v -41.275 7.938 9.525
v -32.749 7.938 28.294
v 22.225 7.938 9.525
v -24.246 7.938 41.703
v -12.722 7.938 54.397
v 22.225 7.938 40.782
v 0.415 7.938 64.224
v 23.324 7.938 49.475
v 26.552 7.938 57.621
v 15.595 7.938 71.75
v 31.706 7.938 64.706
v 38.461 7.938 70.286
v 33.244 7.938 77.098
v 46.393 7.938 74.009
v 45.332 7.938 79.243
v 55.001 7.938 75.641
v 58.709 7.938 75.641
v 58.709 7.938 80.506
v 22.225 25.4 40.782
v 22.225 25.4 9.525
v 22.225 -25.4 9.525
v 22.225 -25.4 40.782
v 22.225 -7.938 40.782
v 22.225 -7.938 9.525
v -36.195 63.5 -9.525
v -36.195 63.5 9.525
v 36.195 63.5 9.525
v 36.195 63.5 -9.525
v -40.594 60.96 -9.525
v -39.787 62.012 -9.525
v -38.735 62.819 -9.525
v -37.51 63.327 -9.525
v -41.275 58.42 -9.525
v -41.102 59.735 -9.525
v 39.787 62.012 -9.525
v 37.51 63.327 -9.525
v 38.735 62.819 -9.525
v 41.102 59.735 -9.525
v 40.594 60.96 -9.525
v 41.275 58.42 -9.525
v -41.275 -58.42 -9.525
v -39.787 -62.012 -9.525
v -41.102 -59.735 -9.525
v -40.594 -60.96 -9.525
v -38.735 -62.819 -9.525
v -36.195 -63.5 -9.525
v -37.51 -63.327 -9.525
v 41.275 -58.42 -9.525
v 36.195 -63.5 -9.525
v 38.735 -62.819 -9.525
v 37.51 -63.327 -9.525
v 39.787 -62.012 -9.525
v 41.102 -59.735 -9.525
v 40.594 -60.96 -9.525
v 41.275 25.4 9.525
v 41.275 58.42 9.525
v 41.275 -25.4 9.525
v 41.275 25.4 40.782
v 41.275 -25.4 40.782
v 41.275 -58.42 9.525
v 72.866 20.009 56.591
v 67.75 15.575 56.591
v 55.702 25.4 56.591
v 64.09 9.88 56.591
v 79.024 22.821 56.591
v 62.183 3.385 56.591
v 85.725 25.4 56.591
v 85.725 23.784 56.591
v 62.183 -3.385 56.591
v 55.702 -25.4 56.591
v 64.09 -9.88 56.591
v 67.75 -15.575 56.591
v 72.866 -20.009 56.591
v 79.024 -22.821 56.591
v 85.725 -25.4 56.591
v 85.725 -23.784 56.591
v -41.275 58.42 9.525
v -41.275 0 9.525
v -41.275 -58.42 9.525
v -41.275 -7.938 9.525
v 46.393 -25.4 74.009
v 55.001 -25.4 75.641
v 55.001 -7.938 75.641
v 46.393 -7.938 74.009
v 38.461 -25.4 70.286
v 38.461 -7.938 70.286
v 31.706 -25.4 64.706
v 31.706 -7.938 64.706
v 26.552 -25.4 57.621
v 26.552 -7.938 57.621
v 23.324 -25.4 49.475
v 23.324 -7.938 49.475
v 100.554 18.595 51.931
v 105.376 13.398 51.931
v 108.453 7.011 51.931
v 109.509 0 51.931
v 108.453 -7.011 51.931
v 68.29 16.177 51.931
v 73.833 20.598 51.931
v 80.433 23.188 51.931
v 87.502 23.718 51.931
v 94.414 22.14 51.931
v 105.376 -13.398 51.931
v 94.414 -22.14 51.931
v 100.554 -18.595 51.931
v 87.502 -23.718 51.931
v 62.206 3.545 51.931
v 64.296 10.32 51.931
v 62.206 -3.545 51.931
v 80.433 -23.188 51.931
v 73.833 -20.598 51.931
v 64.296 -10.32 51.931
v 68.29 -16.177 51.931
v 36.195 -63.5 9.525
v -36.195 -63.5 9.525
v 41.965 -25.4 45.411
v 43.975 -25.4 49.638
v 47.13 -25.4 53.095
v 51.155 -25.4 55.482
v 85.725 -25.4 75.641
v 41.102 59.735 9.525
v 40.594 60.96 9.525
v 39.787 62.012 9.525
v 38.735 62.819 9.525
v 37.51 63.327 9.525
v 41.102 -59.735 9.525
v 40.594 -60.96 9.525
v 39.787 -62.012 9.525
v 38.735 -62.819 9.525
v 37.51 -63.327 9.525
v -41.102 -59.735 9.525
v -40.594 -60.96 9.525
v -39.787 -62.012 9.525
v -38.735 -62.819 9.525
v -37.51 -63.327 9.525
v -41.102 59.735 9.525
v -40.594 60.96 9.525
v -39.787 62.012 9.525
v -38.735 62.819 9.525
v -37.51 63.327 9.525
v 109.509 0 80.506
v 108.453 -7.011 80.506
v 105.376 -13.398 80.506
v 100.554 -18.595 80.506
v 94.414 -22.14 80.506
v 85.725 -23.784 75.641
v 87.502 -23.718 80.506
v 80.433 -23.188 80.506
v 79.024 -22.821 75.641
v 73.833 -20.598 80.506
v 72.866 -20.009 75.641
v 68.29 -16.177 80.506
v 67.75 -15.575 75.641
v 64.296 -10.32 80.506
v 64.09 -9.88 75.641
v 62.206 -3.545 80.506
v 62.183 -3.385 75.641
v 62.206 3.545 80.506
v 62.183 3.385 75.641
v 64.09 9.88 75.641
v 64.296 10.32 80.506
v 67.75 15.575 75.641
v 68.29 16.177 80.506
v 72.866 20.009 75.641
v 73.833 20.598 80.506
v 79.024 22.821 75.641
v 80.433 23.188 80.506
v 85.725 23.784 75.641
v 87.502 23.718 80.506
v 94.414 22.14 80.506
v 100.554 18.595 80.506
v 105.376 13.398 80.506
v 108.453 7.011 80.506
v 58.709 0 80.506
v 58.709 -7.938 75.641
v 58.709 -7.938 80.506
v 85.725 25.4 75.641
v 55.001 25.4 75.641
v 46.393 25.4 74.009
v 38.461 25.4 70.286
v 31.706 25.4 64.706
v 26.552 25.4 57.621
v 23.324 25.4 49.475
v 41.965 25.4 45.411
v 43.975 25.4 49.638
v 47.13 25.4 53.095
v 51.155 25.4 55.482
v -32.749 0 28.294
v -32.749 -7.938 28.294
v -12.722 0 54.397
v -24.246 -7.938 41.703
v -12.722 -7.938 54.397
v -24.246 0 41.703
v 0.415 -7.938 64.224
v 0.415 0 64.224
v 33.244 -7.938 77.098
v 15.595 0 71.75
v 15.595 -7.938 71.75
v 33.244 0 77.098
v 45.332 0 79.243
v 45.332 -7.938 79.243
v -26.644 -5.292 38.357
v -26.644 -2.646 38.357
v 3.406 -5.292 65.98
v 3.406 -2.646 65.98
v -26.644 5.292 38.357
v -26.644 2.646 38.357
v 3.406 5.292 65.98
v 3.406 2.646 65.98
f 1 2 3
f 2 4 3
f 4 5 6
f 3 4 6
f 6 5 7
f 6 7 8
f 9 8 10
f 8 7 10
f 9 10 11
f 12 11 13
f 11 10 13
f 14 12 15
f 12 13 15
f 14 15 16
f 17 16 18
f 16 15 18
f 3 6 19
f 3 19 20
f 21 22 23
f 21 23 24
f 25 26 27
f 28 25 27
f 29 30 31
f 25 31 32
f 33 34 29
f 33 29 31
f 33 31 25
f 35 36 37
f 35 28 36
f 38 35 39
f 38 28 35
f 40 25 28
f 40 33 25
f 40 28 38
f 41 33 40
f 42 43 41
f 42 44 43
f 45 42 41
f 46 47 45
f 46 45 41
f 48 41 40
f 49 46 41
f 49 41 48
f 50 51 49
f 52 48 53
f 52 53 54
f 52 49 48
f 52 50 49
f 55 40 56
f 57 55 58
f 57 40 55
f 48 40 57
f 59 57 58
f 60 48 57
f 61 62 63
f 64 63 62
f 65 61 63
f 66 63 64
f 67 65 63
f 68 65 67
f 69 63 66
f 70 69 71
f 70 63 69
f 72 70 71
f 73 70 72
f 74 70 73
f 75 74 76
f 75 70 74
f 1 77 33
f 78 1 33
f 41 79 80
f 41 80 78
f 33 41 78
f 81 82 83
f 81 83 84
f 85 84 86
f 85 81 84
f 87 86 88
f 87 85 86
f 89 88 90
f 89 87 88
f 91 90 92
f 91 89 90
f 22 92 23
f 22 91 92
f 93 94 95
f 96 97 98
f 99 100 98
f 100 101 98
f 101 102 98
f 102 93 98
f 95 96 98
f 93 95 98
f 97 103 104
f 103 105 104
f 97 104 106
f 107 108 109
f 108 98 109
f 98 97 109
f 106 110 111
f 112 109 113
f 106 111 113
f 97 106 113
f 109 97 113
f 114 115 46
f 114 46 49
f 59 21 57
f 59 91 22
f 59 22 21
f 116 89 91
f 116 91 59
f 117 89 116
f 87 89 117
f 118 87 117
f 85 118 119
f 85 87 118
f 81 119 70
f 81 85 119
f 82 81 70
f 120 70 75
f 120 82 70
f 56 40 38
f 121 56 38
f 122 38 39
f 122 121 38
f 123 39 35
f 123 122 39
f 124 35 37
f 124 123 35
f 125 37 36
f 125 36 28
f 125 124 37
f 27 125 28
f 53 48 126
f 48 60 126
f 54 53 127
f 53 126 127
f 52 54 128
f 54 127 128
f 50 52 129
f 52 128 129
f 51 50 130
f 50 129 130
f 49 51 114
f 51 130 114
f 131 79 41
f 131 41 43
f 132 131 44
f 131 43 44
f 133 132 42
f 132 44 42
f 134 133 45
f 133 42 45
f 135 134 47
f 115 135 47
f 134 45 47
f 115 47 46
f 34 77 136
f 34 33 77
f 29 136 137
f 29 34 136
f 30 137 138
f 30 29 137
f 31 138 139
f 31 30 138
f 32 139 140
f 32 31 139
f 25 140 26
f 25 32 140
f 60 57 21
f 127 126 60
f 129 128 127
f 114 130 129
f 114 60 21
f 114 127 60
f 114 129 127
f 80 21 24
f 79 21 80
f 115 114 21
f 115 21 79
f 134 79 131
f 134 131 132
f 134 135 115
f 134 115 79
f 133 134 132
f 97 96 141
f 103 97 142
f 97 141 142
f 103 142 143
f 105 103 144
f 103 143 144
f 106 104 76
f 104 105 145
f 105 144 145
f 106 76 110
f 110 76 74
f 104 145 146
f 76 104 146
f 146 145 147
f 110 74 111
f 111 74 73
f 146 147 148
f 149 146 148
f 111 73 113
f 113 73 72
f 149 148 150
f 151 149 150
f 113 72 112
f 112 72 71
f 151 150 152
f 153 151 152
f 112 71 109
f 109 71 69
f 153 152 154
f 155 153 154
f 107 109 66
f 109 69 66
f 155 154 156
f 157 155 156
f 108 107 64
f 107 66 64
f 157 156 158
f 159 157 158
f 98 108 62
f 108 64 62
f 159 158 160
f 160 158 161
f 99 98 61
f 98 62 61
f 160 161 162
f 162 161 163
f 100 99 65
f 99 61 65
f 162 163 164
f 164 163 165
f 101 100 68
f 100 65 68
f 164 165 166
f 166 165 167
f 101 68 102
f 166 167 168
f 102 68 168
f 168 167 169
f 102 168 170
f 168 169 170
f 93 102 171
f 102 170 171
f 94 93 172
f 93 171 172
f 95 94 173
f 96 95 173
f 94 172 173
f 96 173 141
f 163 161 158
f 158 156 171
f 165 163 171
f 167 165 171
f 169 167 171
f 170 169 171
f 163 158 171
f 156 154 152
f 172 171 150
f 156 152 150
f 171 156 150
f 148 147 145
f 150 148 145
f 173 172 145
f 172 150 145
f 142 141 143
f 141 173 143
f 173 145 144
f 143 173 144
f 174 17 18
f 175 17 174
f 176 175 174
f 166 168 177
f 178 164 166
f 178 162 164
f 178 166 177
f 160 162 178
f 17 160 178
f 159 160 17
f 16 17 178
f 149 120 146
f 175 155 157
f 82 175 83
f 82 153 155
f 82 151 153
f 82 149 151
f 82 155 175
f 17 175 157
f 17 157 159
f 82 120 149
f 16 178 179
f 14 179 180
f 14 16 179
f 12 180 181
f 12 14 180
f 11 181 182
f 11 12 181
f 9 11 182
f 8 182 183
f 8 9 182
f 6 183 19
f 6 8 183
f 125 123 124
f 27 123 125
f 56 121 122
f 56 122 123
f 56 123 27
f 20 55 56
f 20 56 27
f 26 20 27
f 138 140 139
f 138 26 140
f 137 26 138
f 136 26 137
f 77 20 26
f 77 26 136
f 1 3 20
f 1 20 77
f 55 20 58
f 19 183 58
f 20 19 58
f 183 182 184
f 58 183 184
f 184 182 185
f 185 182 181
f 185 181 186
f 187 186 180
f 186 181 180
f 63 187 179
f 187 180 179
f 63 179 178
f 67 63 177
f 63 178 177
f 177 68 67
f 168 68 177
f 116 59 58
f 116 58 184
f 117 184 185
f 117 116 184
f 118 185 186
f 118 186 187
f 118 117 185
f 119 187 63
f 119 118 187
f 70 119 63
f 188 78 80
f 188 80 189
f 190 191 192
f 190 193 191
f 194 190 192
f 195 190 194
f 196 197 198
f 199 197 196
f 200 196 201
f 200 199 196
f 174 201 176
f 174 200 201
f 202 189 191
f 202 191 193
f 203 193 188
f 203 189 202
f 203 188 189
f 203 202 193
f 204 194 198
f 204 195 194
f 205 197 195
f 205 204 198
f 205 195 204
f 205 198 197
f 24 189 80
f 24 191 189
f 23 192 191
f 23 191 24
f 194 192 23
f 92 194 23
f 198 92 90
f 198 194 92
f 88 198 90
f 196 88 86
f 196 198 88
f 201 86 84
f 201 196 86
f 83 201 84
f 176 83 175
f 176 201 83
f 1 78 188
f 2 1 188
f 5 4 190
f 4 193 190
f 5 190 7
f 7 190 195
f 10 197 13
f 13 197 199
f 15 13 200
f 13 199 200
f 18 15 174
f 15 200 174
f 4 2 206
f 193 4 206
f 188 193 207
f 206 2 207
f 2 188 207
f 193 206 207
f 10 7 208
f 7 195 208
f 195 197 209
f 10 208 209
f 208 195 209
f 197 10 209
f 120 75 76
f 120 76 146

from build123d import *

# Parameters (mm, degrees)
F1_DEPTH = 63.5
F0_W     = 27.0158293307
F0_H     = 19.05
F2_DEPTH = 25.4
F3_DEPTH = 7.9375
F5_R     = 5.08


with BuildPart() as f1:
    # F0 (on Front) → F1 (new body, symmetric)
    with BuildSketch(Plane.XZ):
        Polygon((41.275, -9.525), (41.275, 9.525), (22.225, 9.525), (-41.275, 9.525), (-41.275, -9.525), align=None)
    extrude(amount=F1_DEPTH, both=True)

    # F0 (on Front) → F2 (join, symmetric)
    with BuildSketch(Plane.XZ):
        with BuildLine():
            Line((22.225, 9.525), (41.275, 9.525))
            Line((41.275, 9.525), (41.275, 40.7823575326))
            ThreePointArc((41.275, 40.7823575326), (45.4239723265, 51.4835677445), (55.7022, 56.5912))
            Line((55.7022, 56.5912), (58.7091706693, 56.5912))
            Line((58.7091706693, 56.5912), (58.7091706693, 75.6412))
            Line((58.7091706693, 75.6412), (55.0013430169, 75.6412))
            ThreePointArc((55.0013430169, 75.6412), (31.7059685768, 64.7063390142), (22.225, 40.7823575326))
            Line((22.225, 40.7823575326), (22.225, 9.525))
        make_face()
        with Locations((72.2170853347, 66.1162)):
            Rectangle(F0_W, F0_H)
    extrude(amount=F2_DEPTH, both=True)

    # F0 (on Front) → F3 (join, symmetric)
    with BuildSketch(Plane.XZ):
        with BuildLine():
            Line((-41.275, 9.525), (22.225, 9.525))
            Line((22.225, 9.525), (22.225, 40.7823575326))
            ThreePointArc((22.225, 40.7823575326), (31.7059685768, 64.7063390142), (55.0013430169, 75.6412))
            Line((55.0013430169, 75.6412), (58.7091706693, 75.6412))
            Line((58.7091706693, 75.6412), (58.7091706693, 80.5059267402))
            add(Edge.make_bspline(
                [(-41.275, 9.525), (-31.0757625848, 34.9992662668), (-12.4977082014, 76.490201056), (58.7091706693, 80.5059267402)],
                knots=[0, 0, 0, 0, 122.6178059881, 122.6178059881, 122.6178059881, 122.6178059881], degree=3))
        make_face()
    extrude(amount=F3_DEPTH, both=True)

    # F0 (on Front) → F4 (revolve)
    with BuildSketch(Plane.XZ):
        Polygon((109.5091706693, 80.5059267402), (85.725, 80.5059267402), (85.725, 75.6412), (85.725, 56.5912), (85.725, 51.9309267402), (109.5091706693, 51.9309267402), align=None)
    revolve(axis=Axis((85.725, 0, 66.2184267402), (0, 0, -1)))

    # F5
    f5_edges = [f1.edges().sort_by_distance(p)[0] for p in [
        (41.275, 63.5, 0),
        (-41.275, 63.5, 0),
        (-41.275, -63.5, 0),
        (41.275, -63.5, 0),
    ]]
    fillet(f5_edges, radius=F5_R)


solid = f1.part
